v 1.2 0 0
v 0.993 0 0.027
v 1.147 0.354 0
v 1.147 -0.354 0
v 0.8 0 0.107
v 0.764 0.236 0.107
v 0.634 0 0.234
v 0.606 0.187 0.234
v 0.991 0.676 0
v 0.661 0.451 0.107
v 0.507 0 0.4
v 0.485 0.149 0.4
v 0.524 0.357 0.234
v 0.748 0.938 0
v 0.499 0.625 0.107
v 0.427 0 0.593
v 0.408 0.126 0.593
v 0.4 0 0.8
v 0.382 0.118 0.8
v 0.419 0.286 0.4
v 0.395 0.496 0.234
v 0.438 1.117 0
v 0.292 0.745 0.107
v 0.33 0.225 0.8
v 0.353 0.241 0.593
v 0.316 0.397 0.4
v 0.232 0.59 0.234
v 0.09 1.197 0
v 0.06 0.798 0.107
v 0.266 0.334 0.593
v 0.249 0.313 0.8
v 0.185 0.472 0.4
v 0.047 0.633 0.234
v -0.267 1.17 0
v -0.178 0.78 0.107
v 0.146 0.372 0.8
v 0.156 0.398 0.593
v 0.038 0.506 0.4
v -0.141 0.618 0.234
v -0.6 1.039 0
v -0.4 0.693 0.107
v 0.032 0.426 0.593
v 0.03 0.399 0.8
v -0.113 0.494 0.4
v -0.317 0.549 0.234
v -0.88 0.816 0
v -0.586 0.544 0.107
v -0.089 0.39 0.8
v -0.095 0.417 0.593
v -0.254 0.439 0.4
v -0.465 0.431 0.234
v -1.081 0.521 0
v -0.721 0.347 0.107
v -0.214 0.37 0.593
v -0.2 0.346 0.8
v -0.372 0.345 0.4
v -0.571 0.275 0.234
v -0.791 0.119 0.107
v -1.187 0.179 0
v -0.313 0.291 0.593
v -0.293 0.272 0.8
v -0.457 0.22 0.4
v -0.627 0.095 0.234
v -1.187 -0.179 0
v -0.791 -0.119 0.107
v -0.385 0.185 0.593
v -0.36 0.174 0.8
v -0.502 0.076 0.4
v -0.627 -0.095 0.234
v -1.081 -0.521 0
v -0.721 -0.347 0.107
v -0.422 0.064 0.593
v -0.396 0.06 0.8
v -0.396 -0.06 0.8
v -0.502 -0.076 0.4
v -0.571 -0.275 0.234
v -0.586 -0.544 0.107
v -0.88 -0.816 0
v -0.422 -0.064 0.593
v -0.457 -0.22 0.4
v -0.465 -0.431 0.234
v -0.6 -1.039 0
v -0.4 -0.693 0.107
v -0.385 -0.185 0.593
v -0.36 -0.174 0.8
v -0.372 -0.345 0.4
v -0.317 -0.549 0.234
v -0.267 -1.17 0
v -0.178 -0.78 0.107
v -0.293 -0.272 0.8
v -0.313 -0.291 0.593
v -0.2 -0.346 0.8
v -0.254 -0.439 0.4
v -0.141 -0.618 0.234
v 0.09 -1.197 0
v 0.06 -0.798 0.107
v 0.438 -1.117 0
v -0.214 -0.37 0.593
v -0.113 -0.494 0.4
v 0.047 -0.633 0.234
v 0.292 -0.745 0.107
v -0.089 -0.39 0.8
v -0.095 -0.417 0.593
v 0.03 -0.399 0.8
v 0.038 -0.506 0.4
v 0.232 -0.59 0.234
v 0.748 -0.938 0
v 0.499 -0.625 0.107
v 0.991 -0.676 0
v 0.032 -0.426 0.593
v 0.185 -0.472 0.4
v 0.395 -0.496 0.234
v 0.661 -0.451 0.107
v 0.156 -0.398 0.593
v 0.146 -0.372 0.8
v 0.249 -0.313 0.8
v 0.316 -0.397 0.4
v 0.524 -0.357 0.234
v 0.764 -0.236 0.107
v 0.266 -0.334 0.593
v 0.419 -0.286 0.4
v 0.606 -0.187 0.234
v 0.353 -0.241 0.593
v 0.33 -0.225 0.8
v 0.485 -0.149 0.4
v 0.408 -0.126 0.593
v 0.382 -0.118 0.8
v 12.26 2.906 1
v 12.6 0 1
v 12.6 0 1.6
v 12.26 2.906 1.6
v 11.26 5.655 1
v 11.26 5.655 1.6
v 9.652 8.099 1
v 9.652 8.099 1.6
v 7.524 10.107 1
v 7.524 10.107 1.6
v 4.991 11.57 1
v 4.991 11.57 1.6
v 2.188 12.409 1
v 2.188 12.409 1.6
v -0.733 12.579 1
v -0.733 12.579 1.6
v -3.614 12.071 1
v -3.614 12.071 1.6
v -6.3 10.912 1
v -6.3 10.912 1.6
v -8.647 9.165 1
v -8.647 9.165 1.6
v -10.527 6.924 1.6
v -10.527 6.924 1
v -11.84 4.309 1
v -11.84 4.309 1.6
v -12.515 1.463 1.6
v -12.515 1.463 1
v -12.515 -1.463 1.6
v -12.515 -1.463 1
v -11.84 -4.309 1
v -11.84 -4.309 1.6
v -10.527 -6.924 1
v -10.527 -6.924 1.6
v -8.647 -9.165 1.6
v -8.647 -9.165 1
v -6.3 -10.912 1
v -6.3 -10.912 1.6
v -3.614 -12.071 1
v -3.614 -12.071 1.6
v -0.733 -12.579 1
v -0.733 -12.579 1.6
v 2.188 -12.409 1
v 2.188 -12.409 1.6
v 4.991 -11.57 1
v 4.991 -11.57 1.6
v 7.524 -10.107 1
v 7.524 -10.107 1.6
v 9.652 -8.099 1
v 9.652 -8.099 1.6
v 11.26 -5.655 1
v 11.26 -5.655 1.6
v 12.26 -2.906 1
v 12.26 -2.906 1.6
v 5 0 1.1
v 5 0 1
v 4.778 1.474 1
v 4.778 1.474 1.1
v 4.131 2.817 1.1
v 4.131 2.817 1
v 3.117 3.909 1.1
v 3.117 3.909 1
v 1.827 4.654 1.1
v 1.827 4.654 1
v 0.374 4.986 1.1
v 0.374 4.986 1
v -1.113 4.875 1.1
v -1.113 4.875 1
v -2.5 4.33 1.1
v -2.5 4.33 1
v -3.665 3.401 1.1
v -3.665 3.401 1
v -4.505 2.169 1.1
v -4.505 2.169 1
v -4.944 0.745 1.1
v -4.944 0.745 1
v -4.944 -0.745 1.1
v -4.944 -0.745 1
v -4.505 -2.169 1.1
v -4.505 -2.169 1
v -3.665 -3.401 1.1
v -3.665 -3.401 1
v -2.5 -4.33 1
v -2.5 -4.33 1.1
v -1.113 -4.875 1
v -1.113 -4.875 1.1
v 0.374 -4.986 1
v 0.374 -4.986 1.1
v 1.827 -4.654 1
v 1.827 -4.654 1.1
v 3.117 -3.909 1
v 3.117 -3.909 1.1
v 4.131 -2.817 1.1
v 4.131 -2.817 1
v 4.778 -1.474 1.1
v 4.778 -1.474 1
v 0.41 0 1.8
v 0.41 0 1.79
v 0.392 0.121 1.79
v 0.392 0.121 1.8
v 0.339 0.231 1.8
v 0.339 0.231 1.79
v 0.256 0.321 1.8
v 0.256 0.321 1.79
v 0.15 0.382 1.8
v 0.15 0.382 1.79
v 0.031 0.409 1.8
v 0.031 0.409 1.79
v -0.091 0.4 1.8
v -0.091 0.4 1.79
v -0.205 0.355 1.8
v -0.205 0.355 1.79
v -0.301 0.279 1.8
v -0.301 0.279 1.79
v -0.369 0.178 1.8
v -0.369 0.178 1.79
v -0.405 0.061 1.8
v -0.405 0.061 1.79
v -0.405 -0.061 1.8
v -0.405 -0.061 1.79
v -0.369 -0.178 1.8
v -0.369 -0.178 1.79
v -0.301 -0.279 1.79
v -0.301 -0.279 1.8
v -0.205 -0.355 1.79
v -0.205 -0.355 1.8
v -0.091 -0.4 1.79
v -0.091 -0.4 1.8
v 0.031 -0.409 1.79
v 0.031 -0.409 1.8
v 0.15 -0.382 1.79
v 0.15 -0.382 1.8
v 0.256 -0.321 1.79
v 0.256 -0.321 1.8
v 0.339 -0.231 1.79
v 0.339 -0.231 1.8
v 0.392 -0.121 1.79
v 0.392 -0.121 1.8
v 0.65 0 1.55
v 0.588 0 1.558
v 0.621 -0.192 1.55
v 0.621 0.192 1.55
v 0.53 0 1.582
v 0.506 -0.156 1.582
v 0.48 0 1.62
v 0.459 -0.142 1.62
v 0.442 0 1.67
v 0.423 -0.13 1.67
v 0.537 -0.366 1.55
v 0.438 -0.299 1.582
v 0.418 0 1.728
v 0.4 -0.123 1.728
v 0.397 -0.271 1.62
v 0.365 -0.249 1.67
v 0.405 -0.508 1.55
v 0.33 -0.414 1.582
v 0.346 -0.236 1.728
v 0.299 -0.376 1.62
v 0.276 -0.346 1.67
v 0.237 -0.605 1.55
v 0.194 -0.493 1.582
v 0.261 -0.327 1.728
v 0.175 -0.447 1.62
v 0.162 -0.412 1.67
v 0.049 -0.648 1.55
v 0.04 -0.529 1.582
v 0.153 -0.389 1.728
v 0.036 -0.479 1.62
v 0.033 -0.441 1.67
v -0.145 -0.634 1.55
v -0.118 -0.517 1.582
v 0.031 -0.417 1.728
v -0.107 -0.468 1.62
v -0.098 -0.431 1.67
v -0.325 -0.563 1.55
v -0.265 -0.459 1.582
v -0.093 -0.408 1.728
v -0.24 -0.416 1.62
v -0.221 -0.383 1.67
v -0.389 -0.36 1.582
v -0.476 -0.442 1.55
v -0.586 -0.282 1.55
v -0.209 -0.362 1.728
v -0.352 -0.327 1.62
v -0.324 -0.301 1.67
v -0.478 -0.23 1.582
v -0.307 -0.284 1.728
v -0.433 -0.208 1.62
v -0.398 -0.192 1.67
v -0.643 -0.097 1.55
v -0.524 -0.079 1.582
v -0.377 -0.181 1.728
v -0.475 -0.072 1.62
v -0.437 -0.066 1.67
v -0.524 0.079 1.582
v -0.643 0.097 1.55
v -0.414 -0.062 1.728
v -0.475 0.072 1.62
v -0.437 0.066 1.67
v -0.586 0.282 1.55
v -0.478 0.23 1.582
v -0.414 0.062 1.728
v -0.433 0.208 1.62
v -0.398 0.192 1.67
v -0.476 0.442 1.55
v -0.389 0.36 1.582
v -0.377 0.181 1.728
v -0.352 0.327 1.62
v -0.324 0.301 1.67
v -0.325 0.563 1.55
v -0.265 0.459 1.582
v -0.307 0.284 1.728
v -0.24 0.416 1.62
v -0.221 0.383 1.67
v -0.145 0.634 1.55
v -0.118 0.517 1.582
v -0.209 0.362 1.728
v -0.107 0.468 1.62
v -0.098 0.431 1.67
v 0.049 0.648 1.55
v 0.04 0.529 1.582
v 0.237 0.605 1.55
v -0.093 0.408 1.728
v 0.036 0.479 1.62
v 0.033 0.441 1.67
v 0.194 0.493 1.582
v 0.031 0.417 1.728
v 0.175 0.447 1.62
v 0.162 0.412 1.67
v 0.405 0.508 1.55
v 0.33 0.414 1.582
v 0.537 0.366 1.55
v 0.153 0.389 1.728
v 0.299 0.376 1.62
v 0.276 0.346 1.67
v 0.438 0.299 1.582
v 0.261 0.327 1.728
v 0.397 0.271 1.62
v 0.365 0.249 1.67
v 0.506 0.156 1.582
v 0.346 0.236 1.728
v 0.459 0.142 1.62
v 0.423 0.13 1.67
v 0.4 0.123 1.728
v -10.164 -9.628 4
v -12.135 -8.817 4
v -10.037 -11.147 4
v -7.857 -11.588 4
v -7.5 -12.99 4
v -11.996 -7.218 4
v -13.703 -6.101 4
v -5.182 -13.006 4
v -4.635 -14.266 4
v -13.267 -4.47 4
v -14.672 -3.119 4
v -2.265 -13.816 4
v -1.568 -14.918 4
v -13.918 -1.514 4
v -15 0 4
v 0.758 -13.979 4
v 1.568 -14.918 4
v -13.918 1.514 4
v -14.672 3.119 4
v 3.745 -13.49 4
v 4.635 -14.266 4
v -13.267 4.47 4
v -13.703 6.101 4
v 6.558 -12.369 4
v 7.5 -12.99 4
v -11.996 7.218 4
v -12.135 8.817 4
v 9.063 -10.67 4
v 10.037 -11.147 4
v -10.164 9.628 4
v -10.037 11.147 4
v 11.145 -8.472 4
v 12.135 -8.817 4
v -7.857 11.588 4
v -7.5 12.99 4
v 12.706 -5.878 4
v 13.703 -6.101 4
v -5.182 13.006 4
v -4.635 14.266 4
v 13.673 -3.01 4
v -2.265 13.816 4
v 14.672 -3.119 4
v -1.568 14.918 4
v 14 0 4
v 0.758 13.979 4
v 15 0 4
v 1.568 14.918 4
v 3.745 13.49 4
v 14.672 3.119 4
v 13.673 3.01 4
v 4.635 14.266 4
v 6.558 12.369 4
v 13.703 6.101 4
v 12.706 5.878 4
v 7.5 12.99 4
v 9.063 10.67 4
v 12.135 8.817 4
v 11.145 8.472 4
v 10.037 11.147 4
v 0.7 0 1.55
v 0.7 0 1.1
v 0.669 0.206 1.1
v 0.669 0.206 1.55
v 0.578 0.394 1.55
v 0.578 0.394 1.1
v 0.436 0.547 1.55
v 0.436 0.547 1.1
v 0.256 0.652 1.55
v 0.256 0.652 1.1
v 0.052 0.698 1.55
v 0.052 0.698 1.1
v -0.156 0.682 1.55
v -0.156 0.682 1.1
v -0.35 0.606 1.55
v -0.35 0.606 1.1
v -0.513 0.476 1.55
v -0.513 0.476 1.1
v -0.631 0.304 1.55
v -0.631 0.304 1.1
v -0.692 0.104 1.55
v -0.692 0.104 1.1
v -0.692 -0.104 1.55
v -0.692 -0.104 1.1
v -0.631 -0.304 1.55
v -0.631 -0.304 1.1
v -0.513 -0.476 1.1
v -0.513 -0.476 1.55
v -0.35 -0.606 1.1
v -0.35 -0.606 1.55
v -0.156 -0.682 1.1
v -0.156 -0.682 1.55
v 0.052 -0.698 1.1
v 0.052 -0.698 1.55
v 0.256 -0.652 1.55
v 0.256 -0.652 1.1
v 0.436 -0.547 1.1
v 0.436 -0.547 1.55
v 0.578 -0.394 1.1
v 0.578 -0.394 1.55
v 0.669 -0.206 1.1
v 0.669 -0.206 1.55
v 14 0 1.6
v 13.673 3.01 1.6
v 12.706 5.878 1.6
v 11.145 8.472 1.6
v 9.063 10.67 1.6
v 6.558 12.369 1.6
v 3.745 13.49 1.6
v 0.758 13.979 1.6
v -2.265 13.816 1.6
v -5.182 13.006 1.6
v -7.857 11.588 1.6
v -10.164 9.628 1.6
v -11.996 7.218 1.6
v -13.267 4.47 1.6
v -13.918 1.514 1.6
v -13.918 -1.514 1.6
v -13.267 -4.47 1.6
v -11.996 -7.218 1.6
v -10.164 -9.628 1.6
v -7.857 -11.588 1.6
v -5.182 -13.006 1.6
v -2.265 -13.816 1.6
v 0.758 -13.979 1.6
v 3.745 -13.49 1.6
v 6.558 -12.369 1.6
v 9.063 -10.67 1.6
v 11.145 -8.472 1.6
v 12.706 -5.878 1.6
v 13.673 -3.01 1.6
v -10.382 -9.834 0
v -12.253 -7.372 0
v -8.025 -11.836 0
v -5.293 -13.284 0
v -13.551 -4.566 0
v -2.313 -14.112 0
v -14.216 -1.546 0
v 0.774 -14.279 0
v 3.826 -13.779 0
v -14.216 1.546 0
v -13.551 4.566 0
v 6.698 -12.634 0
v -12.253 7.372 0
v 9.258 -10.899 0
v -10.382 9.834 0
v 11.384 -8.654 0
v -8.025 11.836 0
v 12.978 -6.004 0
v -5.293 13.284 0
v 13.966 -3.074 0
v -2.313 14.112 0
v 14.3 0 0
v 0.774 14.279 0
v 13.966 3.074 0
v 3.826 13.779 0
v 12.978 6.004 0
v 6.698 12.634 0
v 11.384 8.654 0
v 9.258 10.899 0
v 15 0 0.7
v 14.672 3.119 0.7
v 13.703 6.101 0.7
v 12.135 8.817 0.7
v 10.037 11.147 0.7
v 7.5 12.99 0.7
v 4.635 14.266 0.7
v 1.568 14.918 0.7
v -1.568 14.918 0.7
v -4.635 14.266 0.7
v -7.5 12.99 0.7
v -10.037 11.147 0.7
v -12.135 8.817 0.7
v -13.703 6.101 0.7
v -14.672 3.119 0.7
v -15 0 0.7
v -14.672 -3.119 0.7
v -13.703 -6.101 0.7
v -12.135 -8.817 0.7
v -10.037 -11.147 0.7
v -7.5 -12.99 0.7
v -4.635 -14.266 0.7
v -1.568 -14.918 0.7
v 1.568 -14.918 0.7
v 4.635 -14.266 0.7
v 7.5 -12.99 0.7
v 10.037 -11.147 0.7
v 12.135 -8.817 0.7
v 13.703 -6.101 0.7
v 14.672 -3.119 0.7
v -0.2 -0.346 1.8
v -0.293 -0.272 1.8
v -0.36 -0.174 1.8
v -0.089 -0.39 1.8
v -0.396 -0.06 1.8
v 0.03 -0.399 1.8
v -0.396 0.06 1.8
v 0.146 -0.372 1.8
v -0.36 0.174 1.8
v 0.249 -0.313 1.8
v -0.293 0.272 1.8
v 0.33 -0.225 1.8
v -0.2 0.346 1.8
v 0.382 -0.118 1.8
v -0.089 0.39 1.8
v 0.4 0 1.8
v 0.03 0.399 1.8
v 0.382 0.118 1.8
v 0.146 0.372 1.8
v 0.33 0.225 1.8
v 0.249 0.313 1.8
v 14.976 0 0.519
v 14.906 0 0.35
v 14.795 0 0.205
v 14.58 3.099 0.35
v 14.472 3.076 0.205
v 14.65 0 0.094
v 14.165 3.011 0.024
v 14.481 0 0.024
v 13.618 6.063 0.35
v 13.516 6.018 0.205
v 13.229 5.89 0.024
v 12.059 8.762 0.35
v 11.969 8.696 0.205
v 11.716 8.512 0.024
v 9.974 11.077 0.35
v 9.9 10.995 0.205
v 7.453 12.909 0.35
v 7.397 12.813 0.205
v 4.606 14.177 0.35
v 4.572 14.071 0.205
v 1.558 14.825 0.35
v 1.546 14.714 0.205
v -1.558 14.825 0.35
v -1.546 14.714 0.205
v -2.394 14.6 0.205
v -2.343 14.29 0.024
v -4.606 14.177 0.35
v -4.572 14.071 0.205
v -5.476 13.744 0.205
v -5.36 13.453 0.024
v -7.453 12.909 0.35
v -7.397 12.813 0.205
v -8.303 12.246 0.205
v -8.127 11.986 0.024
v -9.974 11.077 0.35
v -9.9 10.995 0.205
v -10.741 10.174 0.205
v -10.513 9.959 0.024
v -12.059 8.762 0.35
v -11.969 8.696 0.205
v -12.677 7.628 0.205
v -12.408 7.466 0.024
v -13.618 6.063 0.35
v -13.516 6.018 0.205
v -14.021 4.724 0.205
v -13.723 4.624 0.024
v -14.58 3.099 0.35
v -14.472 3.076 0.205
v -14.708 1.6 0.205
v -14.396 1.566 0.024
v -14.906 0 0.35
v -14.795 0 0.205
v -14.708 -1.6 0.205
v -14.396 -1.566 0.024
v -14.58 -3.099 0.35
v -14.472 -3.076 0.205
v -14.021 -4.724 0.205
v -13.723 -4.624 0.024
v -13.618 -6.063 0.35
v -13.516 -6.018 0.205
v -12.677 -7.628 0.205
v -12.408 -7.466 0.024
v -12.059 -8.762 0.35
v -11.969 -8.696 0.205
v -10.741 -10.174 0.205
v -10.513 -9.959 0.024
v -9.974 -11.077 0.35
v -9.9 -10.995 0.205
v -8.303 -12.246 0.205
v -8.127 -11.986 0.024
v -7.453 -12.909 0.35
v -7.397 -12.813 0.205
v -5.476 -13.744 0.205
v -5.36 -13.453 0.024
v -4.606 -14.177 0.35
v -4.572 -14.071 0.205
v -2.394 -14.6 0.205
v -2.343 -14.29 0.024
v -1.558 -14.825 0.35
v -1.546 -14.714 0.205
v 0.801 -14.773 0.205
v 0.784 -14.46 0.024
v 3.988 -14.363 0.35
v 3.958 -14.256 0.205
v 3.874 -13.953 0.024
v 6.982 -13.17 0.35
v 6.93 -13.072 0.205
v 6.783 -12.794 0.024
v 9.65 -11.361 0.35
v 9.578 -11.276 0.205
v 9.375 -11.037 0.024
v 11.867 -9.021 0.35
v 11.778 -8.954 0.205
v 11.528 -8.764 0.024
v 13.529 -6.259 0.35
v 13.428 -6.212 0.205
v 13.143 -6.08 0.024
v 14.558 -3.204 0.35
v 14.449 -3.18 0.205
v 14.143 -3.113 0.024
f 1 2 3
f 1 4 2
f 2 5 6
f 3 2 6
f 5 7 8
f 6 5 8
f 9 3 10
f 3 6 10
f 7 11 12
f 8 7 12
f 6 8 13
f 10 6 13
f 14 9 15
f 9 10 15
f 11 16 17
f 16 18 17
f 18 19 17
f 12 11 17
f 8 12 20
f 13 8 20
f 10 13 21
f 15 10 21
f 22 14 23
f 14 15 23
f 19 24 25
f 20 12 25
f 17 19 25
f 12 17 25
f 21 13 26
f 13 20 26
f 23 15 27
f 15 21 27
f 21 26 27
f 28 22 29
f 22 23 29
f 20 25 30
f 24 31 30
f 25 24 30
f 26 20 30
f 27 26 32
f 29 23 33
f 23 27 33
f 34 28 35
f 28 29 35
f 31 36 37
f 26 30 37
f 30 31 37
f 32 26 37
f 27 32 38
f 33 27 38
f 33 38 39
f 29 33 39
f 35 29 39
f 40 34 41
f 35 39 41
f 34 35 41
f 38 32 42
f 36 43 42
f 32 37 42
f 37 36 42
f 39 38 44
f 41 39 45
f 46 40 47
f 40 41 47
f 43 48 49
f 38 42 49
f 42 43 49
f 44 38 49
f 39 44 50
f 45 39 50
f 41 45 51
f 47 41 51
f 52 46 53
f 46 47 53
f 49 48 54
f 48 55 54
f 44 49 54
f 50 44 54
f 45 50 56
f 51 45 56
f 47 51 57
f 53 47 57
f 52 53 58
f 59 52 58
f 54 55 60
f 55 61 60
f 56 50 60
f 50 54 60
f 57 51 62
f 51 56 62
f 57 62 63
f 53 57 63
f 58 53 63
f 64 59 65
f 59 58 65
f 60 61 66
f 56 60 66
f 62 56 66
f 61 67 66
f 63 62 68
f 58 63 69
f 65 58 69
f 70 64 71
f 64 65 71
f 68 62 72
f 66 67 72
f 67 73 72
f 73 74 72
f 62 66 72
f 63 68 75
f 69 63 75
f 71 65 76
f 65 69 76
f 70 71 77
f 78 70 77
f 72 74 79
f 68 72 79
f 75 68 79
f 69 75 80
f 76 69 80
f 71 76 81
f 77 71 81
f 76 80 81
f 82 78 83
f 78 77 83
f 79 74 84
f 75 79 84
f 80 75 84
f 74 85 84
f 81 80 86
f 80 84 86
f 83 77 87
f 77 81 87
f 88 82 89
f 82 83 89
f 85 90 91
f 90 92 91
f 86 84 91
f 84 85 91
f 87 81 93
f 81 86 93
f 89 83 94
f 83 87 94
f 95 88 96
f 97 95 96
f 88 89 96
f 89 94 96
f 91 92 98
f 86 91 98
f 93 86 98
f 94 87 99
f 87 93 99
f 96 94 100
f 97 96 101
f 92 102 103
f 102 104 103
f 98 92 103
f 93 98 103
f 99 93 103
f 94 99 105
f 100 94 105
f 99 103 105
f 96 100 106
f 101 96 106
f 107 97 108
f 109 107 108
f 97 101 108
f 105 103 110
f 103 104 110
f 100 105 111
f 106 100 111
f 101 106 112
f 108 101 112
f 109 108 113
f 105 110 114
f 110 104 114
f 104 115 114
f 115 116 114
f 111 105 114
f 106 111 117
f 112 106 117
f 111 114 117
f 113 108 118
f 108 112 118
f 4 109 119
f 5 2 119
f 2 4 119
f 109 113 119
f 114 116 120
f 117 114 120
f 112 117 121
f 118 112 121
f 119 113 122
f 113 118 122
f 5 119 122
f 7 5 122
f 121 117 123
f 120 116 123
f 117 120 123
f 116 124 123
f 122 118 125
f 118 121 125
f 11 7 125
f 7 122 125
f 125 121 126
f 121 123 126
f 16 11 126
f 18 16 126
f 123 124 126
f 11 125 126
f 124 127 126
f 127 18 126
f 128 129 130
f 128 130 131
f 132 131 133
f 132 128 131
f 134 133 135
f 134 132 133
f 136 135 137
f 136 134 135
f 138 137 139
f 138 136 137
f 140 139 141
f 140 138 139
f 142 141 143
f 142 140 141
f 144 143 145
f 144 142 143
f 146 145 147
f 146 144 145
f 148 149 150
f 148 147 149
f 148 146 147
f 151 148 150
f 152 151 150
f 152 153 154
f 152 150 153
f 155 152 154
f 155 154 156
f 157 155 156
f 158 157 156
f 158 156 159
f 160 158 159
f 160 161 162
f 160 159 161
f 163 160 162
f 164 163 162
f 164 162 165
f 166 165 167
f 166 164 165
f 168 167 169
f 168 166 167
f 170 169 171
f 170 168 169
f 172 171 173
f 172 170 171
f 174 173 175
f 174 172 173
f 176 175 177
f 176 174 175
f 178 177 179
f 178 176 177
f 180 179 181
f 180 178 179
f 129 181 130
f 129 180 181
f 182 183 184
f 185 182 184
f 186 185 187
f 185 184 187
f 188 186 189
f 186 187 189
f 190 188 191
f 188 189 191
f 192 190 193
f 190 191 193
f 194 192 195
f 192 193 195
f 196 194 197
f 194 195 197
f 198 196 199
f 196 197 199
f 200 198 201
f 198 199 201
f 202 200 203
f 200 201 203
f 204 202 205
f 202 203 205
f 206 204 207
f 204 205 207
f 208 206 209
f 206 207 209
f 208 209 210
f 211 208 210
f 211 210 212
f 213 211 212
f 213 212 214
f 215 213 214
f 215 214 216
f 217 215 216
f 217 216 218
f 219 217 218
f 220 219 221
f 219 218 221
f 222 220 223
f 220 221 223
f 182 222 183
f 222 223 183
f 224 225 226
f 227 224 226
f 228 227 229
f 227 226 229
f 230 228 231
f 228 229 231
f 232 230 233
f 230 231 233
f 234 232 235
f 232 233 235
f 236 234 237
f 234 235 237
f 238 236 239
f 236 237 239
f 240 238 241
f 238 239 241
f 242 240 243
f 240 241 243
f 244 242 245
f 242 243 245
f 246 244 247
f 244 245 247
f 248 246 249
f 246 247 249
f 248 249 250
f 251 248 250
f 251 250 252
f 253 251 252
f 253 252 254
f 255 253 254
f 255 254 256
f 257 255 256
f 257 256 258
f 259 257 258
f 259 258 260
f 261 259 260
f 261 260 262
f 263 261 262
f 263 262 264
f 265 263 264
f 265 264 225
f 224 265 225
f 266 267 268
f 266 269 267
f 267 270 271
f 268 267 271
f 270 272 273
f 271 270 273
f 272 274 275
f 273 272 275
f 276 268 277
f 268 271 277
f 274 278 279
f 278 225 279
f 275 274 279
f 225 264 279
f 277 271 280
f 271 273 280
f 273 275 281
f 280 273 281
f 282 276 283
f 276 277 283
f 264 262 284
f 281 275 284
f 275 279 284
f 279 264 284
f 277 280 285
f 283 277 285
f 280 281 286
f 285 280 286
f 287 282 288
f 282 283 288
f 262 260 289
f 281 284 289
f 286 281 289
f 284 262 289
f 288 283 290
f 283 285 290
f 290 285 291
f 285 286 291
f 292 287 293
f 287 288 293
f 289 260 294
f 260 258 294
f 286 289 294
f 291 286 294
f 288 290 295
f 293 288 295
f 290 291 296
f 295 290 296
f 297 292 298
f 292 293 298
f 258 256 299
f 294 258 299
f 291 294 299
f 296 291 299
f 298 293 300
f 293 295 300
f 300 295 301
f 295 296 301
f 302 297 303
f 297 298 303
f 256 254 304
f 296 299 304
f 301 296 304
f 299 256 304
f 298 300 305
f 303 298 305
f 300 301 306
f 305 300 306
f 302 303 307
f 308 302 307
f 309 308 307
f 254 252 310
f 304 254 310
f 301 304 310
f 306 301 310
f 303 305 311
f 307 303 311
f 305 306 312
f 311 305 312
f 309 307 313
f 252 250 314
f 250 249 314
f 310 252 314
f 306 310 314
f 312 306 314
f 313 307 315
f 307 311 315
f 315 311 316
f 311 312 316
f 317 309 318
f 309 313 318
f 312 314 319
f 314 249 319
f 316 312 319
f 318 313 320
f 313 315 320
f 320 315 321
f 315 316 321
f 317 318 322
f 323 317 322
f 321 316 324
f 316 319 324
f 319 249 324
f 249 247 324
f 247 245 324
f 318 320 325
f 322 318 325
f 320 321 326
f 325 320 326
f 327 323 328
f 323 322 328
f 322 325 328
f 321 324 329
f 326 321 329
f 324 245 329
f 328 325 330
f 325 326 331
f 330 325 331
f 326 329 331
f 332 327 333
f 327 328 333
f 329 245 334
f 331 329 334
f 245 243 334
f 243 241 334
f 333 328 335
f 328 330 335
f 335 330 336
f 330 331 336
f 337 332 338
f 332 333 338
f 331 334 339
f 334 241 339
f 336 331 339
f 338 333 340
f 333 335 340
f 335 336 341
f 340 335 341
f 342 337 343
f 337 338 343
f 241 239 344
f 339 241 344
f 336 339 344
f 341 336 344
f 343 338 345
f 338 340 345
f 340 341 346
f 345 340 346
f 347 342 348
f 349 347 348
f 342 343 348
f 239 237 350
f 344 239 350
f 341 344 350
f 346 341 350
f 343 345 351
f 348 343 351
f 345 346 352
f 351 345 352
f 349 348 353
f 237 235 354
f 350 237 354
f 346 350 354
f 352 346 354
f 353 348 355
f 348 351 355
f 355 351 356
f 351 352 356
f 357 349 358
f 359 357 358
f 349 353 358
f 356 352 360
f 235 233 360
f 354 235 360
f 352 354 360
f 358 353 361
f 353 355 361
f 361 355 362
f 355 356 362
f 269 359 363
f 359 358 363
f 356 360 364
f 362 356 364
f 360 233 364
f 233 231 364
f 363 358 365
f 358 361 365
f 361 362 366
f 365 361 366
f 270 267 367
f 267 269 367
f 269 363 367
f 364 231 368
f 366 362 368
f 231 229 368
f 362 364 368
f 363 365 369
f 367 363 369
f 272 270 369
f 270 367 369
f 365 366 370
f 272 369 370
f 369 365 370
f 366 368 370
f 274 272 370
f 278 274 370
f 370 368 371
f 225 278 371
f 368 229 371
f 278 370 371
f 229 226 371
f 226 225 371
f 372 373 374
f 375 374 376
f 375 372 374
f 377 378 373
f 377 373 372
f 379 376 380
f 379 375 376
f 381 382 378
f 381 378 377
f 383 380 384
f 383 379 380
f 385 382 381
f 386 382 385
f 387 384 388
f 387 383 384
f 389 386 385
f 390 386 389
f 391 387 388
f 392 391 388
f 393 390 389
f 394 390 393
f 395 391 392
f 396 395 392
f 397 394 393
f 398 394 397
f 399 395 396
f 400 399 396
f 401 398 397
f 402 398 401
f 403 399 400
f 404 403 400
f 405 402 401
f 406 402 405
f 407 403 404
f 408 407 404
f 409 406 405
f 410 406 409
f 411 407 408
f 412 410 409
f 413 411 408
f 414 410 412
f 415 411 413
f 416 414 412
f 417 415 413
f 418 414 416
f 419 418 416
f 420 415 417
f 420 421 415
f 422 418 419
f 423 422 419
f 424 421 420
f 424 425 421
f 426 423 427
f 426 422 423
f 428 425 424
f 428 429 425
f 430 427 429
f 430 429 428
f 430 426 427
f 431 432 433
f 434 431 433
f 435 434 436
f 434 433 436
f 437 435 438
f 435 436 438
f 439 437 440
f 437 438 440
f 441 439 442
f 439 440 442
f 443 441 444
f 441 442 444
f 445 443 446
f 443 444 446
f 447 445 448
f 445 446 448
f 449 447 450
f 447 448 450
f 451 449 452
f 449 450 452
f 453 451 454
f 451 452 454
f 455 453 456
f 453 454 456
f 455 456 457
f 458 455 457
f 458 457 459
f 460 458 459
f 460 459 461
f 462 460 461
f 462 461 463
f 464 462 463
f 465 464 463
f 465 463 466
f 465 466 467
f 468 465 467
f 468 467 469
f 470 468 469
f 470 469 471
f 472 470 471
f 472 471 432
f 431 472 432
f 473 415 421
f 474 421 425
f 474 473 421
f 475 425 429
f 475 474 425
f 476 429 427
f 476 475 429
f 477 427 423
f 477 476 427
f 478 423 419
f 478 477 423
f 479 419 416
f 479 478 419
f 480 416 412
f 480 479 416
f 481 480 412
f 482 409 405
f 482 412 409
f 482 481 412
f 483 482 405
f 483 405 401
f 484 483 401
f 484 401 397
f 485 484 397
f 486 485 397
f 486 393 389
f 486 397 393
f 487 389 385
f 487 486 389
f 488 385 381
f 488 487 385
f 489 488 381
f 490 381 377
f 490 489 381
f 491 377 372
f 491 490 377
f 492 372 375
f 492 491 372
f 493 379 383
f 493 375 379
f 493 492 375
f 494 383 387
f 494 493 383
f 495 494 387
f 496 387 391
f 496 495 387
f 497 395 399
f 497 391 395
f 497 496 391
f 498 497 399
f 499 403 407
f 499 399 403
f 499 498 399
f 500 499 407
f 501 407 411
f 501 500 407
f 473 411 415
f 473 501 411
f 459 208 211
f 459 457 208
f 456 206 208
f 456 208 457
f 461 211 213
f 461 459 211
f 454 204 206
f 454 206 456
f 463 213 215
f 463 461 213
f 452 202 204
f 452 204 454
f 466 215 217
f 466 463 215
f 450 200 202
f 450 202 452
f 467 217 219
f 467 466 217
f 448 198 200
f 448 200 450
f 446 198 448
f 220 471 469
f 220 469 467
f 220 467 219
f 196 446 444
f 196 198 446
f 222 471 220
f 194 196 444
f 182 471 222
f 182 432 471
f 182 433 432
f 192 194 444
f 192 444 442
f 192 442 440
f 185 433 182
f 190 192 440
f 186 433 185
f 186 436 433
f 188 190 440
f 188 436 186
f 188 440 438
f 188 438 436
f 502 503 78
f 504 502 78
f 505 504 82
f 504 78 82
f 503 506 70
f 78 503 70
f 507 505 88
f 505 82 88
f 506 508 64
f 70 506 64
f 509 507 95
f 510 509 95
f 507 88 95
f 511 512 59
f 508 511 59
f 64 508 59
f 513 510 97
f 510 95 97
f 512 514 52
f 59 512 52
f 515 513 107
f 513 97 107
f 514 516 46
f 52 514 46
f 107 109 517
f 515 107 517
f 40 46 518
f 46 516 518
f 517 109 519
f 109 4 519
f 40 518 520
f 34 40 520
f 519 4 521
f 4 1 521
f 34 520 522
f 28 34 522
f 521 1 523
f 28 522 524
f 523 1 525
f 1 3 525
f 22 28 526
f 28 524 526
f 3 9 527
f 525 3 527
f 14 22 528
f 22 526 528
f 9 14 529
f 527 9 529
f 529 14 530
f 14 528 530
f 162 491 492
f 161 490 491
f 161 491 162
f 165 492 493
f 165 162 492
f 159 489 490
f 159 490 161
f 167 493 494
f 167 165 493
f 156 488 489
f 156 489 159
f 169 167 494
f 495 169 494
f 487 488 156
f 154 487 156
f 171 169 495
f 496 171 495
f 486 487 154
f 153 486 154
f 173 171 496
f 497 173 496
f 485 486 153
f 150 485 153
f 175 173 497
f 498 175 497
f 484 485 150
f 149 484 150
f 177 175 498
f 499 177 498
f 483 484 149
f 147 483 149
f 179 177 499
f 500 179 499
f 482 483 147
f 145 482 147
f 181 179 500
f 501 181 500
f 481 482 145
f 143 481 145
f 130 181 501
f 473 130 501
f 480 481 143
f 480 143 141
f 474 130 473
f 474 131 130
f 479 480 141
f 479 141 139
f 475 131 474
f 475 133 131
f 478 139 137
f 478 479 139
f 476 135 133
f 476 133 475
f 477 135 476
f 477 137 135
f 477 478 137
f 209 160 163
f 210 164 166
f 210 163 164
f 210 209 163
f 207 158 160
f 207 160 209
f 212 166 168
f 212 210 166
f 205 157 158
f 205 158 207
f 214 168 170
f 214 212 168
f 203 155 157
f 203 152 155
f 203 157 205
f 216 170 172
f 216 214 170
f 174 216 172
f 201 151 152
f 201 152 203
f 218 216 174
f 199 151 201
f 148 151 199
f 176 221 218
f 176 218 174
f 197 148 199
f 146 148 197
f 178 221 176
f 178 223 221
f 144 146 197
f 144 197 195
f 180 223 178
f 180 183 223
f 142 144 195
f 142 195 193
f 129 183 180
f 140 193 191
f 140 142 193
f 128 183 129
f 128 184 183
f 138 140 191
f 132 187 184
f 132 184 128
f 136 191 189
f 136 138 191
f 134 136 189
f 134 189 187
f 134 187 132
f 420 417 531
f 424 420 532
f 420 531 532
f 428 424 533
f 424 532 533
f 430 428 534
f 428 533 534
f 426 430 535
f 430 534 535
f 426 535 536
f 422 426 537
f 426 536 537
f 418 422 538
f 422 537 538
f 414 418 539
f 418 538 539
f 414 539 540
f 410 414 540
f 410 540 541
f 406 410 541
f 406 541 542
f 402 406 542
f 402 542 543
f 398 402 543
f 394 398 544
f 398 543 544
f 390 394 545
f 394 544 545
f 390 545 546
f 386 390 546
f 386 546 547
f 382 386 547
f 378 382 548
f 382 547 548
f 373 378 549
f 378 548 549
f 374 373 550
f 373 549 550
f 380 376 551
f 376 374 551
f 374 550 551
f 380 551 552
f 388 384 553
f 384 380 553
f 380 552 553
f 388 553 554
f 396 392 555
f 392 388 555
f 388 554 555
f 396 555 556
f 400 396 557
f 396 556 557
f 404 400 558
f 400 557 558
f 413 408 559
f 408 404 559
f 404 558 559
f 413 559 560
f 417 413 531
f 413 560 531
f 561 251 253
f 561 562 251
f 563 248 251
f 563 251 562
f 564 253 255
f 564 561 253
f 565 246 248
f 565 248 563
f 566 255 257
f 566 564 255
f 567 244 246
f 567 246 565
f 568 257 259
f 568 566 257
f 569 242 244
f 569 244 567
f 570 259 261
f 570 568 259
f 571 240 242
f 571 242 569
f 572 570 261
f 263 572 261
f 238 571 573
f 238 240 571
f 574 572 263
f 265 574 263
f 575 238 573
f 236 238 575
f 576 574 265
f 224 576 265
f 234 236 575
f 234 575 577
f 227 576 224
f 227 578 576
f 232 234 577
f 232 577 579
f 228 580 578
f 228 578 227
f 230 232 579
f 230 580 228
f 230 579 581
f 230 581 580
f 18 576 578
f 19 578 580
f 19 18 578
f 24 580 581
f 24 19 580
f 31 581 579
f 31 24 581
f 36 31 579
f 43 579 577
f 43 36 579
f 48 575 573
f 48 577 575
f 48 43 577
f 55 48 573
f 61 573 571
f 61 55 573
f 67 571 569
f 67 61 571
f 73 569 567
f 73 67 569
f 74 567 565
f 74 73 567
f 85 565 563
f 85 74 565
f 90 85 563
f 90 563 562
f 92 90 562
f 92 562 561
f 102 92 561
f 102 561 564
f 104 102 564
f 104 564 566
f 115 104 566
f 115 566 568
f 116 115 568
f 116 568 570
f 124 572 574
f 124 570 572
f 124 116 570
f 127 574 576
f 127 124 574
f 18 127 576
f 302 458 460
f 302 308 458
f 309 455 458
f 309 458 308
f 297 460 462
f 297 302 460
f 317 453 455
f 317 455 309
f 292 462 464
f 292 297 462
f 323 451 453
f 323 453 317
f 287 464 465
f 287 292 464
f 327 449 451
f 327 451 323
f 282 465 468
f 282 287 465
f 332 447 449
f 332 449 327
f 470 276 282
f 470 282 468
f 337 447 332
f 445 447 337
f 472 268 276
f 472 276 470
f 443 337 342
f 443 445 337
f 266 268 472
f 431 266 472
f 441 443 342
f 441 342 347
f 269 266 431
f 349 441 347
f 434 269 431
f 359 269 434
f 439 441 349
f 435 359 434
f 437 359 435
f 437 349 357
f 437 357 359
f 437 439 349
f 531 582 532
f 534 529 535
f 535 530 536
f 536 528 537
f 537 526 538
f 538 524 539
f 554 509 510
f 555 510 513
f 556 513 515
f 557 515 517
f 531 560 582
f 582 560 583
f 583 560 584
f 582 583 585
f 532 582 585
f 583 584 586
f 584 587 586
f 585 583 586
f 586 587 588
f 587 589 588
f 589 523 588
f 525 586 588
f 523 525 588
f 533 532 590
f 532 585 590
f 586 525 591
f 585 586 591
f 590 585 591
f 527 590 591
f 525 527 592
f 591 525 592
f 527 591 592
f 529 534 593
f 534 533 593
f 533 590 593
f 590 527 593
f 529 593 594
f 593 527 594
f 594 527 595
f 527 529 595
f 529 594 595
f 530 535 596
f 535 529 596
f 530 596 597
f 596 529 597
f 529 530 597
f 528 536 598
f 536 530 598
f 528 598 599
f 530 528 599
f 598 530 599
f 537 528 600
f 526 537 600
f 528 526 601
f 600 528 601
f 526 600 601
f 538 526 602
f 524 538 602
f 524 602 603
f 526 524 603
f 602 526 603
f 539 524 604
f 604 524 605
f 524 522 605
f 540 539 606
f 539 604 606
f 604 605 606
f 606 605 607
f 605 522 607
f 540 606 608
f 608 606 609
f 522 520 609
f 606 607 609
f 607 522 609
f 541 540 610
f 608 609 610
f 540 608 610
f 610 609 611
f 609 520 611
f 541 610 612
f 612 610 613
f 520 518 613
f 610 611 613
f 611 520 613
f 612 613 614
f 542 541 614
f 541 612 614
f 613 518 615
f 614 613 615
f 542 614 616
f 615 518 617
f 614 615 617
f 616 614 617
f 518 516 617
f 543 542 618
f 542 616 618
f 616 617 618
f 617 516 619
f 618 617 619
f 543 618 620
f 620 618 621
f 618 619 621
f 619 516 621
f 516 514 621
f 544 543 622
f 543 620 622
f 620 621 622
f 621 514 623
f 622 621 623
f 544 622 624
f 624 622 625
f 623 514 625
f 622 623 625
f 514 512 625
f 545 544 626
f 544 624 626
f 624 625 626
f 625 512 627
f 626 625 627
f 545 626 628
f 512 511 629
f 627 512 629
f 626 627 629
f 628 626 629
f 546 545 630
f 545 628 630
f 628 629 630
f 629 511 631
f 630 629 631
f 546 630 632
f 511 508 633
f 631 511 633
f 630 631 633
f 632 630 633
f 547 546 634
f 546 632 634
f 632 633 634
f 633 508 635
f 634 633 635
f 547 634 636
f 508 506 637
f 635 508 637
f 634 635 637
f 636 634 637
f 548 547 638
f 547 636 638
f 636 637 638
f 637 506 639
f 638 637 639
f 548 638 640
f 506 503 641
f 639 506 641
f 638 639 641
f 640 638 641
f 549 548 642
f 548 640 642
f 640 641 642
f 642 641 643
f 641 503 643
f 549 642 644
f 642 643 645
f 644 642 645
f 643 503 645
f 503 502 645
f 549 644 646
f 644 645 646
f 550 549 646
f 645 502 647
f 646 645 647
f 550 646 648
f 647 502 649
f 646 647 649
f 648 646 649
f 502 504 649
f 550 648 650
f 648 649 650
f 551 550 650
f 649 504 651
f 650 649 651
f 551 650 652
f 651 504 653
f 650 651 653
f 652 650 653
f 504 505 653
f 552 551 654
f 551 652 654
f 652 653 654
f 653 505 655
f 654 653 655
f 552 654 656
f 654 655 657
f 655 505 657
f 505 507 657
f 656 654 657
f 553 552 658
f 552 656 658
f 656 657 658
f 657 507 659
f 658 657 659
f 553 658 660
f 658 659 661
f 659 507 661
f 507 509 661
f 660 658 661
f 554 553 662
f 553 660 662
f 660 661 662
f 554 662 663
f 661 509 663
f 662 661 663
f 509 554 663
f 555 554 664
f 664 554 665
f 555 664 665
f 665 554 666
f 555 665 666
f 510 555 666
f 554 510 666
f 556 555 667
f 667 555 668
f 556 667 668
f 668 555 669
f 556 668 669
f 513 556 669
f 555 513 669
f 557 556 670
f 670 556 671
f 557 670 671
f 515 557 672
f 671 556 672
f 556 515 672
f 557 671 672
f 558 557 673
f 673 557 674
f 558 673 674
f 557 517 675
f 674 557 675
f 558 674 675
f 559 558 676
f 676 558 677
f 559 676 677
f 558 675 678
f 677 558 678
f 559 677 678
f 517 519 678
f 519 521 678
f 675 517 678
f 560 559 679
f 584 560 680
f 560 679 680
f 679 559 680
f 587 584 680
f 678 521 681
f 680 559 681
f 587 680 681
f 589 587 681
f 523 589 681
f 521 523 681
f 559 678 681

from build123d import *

# Parameters (mm, degrees)
CYLINDER008_R     = 16
CYLINDER008_DEPTH = 10
CYLINDER007_R     = 14
CYLINDER007_DEPTH = 6.4
CYLINDER006_R     = 14
CYLINDER006_DEPTH = 1
CYLINDER005_R     = 0.4
CYLINDER005_DEPTH = 1
CYLINDER001_R     = 12.6
CYLINDER001_DEPTH = 8
CYLINDER_R        = 15
CYLINDER_DEPTH    = 8
CYLINDER002_R     = 15
CYLINDER002_DEPTH = 1
FILLET_R          = 0.7
FILLET001_R       = 0.7
FILLET002_R       = 0.8
CYLINDER014_R     = 0.4
CYLINDER014_DEPTH = 2
CYLINDER012_R     = 0.41
CYLINDER012_DEPTH = 0.8
CYLINDER013_R     = 0.7
CYLINDER013_DEPTH = 0.55
FILLET003_R       = 0.24
CYLINDER015_R     = 5
CYLINDER015_DEPTH = 0.1


with BuildPart() as cylinder008:
    # Cylinder008 → Cylinder008 (new body)
    with BuildSketch(Plane.XY.offset(4)):
        Circle(CYLINDER008_R)
    extrude(amount=CYLINDER008_DEPTH)


with BuildPart() as cylinder007:
    # Cylinder007 → Cylinder007 (new body)
    with BuildSketch(Plane.XY.offset(1.6)):
        Circle(CYLINDER007_R)
    extrude(amount=CYLINDER007_DEPTH)


with BuildPart() as cylinder006:
    # Cylinder006 → Cylinder006 (new body)
    with BuildSketch(Plane.XY.offset(7)):
        Circle(CYLINDER006_R)
    extrude(amount=CYLINDER006_DEPTH)


with BuildPart() as cylinder005:
    # Cylinder005 → Cylinder005 (new body)
    with BuildSketch(Plane.XY):
        Circle(CYLINDER005_R)
    extrude(amount=CYLINDER005_DEPTH)


with BuildPart() as cylinder001:
    # Cylinder001 → Cylinder001 (new body)
    with BuildSketch(Plane.XY):
        Circle(CYLINDER001_R)
    extrude(amount=CYLINDER001_DEPTH)


with BuildPart() as cut:
    # Cylinder → Cylinder (new body)
    with BuildSketch(Plane.XY):
        Circle(CYLINDER_R)
    extrude(amount=CYLINDER_DEPTH)

    # Cut: cut Cylinder001
    add(cylinder001.part, mode=Mode.SUBTRACT)


with BuildPart() as cut007:
    # Cylinder002 → Cylinder002 (new body)
    with BuildSketch(Plane.XY):
        Circle(CYLINDER002_R)
    extrude(amount=CYLINDER002_DEPTH)

    # Fusion: union Cut
    add(cut.part)

    # Cut001: cut Cylinder005
    add(cylinder005.part, mode=Mode.SUBTRACT)

    # Cut003: cut Cylinder006
    add(cylinder006.part, mode=Mode.SUBTRACT)

    # Fillet
    fillet_edges = [cut007.edges().sort_by_distance(p)[0] for p in [
        (-15, 0, 8),
    ]]
    fillet(fillet_edges, radius=FILLET_R)

    # Fillet001
    fillet001_edges = [cut007.edges().sort_by_distance(p)[0] for p in [
        (-15, 0, 0),
    ]]
    fillet(fillet001_edges, radius=FILLET001_R)

    # Fillet002
    fillet002_edges = [cut007.edges().sort_by_distance(p)[0] for p in [
        (-0.4, 0, 0),
    ]]
    fillet(fillet002_edges, radius=FILLET002_R)

    # Cut004: cut Cylinder007
    add(cylinder007.part, mode=Mode.SUBTRACT)

    # Cut007: cut Cylinder008
    add(cylinder008.part, mode=Mode.SUBTRACT)


with BuildPart() as cylinder014:
    # Cylinder014 → Cylinder014 (new body)
    with BuildSketch(Plane.XY.offset(1)):
        Circle(CYLINDER014_R)
    extrude(amount=CYLINDER014_DEPTH)


with BuildPart() as cylinder012:
    # Cylinder012 → Cylinder012 (new body)
    with BuildSketch(Plane.XY.offset(1)):
        Circle(CYLINDER012_R)
    extrude(amount=CYLINDER012_DEPTH)


with BuildPart() as fillet003:
    # Cylinder013 → Cylinder013 (new body)
    with BuildSketch(Plane.XY.offset(1)):
        Circle(CYLINDER013_R)
    extrude(amount=CYLINDER013_DEPTH)

    # Fusion001: union Cylinder012
    add(cylinder012.part)

    # Fillet003
    fillet003_edges = [fillet003.edges().sort_by_distance(p)[0] for p in [
        (-0.41, 0, 1.55),
    ]]
    fillet(fillet003_edges, radius=FILLET003_R)


with BuildPart() as fusion003:
    # Cylinder015 → Cylinder015 (new body)
    with BuildSketch(Plane.XY.offset(1)):
        Circle(CYLINDER015_R)
    extrude(amount=CYLINDER015_DEPTH)

    # Fusion002: union Fillet003
    add(fillet003.part)

    # Cut006: cut Cylinder014
    add(cylinder014.part, mode=Mode.SUBTRACT)

    # Fusion003: union Cut007
    add(cut007.part)


solid = fusion003.part
